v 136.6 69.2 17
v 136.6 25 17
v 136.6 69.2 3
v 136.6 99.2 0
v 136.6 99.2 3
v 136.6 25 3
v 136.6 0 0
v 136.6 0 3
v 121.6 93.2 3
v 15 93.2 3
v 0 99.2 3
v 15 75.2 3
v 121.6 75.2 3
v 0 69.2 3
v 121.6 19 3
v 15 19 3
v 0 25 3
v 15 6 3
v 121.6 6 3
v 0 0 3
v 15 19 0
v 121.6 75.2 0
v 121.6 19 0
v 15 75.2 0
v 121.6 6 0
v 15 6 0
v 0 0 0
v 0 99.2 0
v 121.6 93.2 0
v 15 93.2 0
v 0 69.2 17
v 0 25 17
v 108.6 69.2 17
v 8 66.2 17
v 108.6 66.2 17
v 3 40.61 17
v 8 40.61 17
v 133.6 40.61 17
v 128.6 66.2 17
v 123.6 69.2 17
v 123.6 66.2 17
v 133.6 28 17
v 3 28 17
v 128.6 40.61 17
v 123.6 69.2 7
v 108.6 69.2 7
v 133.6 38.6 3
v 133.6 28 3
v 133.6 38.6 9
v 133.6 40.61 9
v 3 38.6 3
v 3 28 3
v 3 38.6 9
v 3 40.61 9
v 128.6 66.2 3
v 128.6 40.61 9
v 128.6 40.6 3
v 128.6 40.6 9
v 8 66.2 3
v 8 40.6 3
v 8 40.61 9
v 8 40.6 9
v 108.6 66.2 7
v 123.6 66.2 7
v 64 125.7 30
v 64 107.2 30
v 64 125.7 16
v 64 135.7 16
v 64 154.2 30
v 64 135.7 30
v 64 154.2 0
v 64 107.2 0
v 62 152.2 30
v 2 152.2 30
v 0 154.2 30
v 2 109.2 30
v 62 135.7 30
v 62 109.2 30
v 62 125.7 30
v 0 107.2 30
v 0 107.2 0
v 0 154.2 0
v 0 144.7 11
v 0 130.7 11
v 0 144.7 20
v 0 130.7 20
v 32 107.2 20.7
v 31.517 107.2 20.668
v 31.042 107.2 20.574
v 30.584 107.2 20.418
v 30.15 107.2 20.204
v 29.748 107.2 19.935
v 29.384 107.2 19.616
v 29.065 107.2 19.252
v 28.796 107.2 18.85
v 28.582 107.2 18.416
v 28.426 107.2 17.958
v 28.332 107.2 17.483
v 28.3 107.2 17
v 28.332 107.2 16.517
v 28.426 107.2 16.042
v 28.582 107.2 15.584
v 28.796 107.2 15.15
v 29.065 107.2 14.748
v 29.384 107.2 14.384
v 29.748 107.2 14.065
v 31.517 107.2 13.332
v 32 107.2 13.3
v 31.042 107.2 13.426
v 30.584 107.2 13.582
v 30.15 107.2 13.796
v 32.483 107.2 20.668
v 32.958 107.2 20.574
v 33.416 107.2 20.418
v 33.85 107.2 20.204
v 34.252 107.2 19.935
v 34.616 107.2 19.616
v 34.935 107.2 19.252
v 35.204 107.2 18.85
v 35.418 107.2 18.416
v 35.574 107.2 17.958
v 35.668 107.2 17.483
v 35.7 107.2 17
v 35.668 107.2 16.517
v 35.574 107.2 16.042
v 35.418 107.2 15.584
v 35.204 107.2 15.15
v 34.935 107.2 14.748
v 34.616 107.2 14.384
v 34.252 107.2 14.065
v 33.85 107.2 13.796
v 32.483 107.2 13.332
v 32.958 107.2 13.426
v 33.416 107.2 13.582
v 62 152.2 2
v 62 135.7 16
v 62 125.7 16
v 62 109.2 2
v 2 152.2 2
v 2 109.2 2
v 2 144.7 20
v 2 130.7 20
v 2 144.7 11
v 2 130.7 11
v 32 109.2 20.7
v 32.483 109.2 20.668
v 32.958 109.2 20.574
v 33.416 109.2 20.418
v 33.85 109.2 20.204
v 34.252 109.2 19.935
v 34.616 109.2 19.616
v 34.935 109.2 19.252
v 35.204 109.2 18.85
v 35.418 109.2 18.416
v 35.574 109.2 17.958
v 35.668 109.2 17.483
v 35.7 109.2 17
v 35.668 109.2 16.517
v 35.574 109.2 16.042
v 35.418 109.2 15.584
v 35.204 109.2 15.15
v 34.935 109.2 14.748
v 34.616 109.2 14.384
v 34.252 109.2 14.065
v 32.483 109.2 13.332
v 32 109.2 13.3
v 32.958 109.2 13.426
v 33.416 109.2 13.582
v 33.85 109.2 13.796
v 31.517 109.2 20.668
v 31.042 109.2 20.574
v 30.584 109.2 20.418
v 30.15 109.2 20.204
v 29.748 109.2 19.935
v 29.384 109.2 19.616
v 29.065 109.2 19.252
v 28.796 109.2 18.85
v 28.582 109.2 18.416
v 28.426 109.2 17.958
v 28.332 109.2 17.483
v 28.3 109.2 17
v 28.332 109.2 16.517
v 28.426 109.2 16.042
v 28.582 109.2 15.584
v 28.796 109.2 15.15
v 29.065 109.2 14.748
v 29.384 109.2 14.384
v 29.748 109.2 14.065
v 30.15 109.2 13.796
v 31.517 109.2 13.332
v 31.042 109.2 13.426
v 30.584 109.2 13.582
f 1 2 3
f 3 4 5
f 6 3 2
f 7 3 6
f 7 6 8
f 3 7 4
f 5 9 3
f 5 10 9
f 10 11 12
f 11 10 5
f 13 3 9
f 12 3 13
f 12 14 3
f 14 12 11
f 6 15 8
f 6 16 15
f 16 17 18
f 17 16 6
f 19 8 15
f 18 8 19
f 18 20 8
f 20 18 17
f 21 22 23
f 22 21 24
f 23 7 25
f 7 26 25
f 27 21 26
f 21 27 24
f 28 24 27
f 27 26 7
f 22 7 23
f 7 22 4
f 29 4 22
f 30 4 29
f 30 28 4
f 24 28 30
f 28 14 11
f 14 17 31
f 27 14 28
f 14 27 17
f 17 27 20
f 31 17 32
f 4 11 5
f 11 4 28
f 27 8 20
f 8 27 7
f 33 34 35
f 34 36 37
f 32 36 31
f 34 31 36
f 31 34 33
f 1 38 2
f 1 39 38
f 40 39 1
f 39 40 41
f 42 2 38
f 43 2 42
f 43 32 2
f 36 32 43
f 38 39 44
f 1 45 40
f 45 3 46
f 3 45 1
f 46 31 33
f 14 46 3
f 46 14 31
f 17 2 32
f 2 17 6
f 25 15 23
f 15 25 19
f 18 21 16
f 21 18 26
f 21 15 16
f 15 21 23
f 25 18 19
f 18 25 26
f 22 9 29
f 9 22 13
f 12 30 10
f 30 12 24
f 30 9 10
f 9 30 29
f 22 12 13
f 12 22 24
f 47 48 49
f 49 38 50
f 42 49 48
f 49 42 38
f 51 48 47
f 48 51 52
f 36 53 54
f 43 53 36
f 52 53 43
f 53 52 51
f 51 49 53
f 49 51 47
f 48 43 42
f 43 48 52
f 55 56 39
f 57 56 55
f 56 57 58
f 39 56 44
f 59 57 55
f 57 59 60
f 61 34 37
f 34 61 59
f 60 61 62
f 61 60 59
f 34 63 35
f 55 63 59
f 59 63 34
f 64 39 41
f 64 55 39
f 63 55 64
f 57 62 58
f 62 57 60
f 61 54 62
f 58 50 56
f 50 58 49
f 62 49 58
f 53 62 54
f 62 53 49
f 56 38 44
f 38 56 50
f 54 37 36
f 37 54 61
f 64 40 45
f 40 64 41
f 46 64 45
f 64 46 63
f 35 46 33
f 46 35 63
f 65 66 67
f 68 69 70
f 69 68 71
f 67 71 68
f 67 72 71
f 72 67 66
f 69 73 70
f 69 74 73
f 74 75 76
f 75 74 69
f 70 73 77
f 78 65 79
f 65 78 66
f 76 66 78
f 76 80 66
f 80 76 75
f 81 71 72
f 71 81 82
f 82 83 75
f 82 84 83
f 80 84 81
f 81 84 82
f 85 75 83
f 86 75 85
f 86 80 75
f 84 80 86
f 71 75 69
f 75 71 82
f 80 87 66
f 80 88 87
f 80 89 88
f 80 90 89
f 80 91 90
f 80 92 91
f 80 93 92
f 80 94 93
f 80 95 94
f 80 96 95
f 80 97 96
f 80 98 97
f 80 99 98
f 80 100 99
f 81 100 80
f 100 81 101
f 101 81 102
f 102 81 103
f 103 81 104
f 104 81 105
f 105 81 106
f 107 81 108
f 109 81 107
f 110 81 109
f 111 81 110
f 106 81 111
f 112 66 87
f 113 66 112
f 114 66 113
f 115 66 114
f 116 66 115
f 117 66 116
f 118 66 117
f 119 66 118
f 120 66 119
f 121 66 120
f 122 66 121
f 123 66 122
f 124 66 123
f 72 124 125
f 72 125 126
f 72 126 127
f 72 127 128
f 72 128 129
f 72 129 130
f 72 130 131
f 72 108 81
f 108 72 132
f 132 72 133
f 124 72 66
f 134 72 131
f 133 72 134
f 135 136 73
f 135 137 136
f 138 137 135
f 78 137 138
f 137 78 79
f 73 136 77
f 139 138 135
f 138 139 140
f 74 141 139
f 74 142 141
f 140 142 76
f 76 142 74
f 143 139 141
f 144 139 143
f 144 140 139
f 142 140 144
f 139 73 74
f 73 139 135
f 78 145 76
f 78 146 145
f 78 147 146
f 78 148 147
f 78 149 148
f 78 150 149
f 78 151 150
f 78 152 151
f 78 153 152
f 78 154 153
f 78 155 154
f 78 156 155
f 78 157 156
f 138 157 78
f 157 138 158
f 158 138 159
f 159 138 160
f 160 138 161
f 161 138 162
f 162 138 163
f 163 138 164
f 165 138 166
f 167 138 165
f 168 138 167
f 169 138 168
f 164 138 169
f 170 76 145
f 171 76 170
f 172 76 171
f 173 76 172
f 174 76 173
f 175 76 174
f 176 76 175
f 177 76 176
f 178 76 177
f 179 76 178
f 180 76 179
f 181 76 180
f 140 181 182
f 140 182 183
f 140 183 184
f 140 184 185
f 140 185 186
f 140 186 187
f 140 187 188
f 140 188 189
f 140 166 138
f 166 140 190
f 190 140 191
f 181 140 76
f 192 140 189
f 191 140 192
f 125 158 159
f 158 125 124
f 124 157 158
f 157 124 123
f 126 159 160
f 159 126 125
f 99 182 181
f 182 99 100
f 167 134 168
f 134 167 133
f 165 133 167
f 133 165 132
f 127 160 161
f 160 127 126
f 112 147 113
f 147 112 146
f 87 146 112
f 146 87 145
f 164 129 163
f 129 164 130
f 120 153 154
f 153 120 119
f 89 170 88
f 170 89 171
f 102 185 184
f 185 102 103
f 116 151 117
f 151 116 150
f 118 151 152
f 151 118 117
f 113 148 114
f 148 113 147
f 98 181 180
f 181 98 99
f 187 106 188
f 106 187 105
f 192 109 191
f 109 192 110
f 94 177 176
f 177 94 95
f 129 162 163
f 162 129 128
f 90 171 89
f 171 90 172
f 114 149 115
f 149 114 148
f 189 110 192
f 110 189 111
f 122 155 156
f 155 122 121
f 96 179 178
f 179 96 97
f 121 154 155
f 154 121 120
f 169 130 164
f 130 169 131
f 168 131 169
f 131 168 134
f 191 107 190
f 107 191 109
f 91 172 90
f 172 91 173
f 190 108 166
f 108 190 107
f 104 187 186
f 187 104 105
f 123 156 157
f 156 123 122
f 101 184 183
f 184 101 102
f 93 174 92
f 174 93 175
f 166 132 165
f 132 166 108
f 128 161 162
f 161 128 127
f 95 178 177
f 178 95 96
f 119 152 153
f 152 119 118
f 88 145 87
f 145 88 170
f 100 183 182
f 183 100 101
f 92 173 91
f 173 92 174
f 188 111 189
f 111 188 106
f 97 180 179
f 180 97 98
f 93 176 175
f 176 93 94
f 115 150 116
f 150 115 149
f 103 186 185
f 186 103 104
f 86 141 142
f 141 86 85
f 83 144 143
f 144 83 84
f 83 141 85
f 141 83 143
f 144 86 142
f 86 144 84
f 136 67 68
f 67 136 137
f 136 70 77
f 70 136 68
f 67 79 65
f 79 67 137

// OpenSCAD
// Fume extractor bench rig: a quick, support-free print for testing the fan, filter,
// ESP32 DevKit and a bare EC11 encoder before the full case.
//   part = "stand"  : base that holds the 120 mm fan upright with the 130 mm filter in front
//   part = "box"    : open-top control box for the DevKit, encoder in the front wall
//   part = "both"   : both, laid out for one print (fits a 220 x 220 bed)

part = "both";
$fn = 48;

// Fan and filter
fan_w = 120.0;   fan_d = 25.0;
filt_w = 130.0;  filt_d = 10.0;
clr = 0.6;       // slot clearance

// Stand
wall = 3.0;
base_t = 3.0;
pocket_h = 14.0;           // how deep the fan and filter sit
rib_h = 6.0;               // low rib between filter and fan, so it doesn't block airflow
foot_back = 30.0;          // extra base behind the fan, against tipping backward
foot_front = 25.0;         // extra base in front of the filter

// Control box (fits 30- and 38-pin DevKits: ~51-55 x 28 mm)
board_l = 56.0;  board_w = 29.0;
box_wall = 2.0;
box_h = 30.0;              // outer height, open top
enc_hole = 7.4;            // EC11 M7 bushing
enc_z = 17.0;              // encoder shaft height above the floor
usb_w = 14.0;  usb_h = 9.0;
cable_w = 10.0; cable_h = 6.0;

stand_w = filt_w + clr + 2 * wall;
stand_d = foot_front + wall + filt_d + clr + 2 + fan_d + clr + wall + foot_back;

module stand() {
  y_filt = foot_front + wall;
  y_fan = y_filt + filt_d + clr + 2;
  difference() {
    union() {
      cube([stand_w, stand_d, base_t]);
      // pocket block, from the filter's front wall to the fan's back wall
      translate([0, foot_front, 0])
        cube([stand_w, wall + filt_d + clr + 2 + fan_d + clr + wall, base_t + pocket_h]);
    }
    // filter pocket (full width of the pad)
    translate([wall, y_filt, base_t]) cube([filt_w + clr, filt_d + clr, pocket_h + 1]);
    // fan pocket (centred)
    translate([(stand_w - fan_w - clr) / 2, y_fan, base_t]) cube([fan_w + clr, fan_d + clr, pocket_h + 1]);
    // lower the rib between them
    translate([wall, y_filt + filt_d + clr - 0.01, base_t + rib_h]) cube([filt_w + clr, 2.02, pocket_h]);
    // cable notch at the back-right for the fan lead
    translate([stand_w - wall - 25, y_fan + fan_d + clr - 1, base_t + 4]) cube([15, wall + 2, pocket_h]);
    // lighten the feet
    for (y = [6, stand_d - foot_back + 6])
      translate([15, y, -1]) cube([stand_w - 30, (y < 20 ? foot_front : foot_back) - 12, base_t + 2]);
  }
}

module box() {
  ox = board_l + 2 * box_wall + 4;   // 4 mm slack for the encoder body and wires
  oy = board_w + 2 * box_wall + 14;  // room for the 12 mm encoder body behind the front wall
  difference() {
    cube([ox, oy, box_h]);
    translate([box_wall, box_wall, box_wall]) cube([ox - 2 * box_wall, oy - 2 * box_wall, box_h]);
    // encoder hole through the front wall (y = 0), centred
    translate([ox / 2, -1, enc_z]) rotate([-90, 0, 0]) cylinder(d = enc_hole, h = box_wall + 2);
    // USB opening at the left end, at board height (board sits on its header pins)
    translate([-1, box_wall + 14 + (board_w - usb_w) / 2, box_wall + 9]) cube([box_wall + 2, usb_w, usb_h]);
    // fan cable / USB-for-fan slot at the right end, open to the top
    translate([ox - box_wall - 1, oy / 2 - cable_w / 2, box_h - cable_h - 8]) cube([box_wall + 2, cable_w, cable_h + 9]);
  }
}

if (part == "stand") stand();
else if (part == "box") box();
else { stand(); translate([0, stand_d + 8, 0]) box(); }
